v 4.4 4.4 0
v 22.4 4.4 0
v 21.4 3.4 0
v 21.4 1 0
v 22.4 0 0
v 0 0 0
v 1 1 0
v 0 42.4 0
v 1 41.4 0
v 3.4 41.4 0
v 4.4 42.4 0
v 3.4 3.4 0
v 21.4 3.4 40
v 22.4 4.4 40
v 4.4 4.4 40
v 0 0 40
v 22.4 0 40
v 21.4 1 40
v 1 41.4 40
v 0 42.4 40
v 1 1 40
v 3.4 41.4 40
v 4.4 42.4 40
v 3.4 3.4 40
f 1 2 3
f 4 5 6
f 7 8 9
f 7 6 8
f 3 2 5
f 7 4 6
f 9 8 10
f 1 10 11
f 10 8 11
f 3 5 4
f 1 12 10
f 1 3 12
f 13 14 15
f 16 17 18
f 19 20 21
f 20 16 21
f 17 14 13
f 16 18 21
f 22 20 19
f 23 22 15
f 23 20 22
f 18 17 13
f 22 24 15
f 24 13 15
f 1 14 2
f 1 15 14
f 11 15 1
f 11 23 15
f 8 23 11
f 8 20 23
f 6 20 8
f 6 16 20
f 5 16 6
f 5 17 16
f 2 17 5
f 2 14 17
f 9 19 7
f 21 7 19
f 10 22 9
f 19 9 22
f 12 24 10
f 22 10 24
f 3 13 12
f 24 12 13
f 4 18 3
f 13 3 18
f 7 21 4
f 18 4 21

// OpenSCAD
// Goal
$fs = 0.4;
$fa = 1;

goal_mouth_width = 250;
goal_mouth_height = 120;
bezel_width = 20;
bezel_thickness = 2;
liner_thickness = 2;
liner_depth = 38; //3x2 CLS is 63mmx38mm
surround_height = 63;

bezel_x = goal_mouth_width + (bezel_width*2);
bezel_y = goal_mouth_height + (bezel_width);

liner_x = goal_mouth_width + (liner_thickness*2);
liner_y = goal_mouth_height + (liner_thickness);

joiner_wall = 1;
joiner_slop = 0.2;
joiner_length = 40;
  
module solid_goal() {
  // bezel
  cube([bezel_x, bezel_y, bezel_thickness]);
  // liner 
  translate([bezel_width-liner_thickness, 0, 0])
    cube([liner_x, liner_y, liner_depth+bezel_thickness]);
  
}

module goal_mouth() {
  translate([bezel_width,-1,-1])
  cube([goal_mouth_width, goal_mouth_height+1, liner_depth+bezel_thickness+2]);
}

module screwholes() {
  screwhole_d = 3.2;
  screwhole_offset = 15;
  
  translate([0,screwhole_offset, (liner_depth/2)+bezel_thickness])
    rotate([-90,0,-90])
      cylinder(d=screwhole_d, h=bezel_x);
  translate([0,surround_height-screwhole_offset, (liner_depth/2)+bezel_thickness])
    rotate([-90,0,-90])
      cylinder(d=screwhole_d, h=bezel_x);
}

module goal() {
  difference() {
    solid_goal();  
    goal_mouth();
    screwholes();
  }
}

module goal_r() {
  difference() {
    goal();
    translate([bezel_x/2, -1, -1])
      cube([bezel_x, bezel_y+2, liner_depth+4]);
  }
  
}

module goal_l() {
  difference() {
    goal();
    translate([-bezel_x+(bezel_x/2), -1, -1])
      cube([bezel_x, bezel_y+2, liner_depth+4]);
  }
  
}

module joiner_cutout_profile() {
  // holder for the bezel
  bh_x = bezel_width + (joiner_slop*2);
  bh_y = bezel_thickness + (joiner_slop*2);
  square([bh_x, bh_y]);
  
  // holder for the liner
  lh_x = liner_thickness + (joiner_slop*2);
  lh_y = liner_depth + bezel_thickness+ (joiner_slop*2);
  square([lh_x, lh_y]);
}

module joiner_profile() {
  joiner_wall = 1;
  joiner_slop = 0.2;
  
  // holder for the bezel
  bh_x = bezel_width + (joiner_wall*2) + (joiner_slop*2);
  bh_y = bezel_thickness + (joiner_wall*2) + (joiner_slop*2);
  square([bh_x, bh_y]);
  
  // holder for the liner
  lh_x = liner_thickness + (joiner_wall*2) + (joiner_slop*2);
  lh_y = liner_depth + bezel_thickness + (joiner_wall*2) + (joiner_slop*2);
  square([lh_x, lh_y]);
}

module joiner() {
  linear_extrude(height=joiner_length)
  difference() {
    joiner_profile();
    translate([joiner_wall, joiner_wall])
      joiner_cutout_profile();
  }
}

//goal_l();
//goal_r();
joiner();
